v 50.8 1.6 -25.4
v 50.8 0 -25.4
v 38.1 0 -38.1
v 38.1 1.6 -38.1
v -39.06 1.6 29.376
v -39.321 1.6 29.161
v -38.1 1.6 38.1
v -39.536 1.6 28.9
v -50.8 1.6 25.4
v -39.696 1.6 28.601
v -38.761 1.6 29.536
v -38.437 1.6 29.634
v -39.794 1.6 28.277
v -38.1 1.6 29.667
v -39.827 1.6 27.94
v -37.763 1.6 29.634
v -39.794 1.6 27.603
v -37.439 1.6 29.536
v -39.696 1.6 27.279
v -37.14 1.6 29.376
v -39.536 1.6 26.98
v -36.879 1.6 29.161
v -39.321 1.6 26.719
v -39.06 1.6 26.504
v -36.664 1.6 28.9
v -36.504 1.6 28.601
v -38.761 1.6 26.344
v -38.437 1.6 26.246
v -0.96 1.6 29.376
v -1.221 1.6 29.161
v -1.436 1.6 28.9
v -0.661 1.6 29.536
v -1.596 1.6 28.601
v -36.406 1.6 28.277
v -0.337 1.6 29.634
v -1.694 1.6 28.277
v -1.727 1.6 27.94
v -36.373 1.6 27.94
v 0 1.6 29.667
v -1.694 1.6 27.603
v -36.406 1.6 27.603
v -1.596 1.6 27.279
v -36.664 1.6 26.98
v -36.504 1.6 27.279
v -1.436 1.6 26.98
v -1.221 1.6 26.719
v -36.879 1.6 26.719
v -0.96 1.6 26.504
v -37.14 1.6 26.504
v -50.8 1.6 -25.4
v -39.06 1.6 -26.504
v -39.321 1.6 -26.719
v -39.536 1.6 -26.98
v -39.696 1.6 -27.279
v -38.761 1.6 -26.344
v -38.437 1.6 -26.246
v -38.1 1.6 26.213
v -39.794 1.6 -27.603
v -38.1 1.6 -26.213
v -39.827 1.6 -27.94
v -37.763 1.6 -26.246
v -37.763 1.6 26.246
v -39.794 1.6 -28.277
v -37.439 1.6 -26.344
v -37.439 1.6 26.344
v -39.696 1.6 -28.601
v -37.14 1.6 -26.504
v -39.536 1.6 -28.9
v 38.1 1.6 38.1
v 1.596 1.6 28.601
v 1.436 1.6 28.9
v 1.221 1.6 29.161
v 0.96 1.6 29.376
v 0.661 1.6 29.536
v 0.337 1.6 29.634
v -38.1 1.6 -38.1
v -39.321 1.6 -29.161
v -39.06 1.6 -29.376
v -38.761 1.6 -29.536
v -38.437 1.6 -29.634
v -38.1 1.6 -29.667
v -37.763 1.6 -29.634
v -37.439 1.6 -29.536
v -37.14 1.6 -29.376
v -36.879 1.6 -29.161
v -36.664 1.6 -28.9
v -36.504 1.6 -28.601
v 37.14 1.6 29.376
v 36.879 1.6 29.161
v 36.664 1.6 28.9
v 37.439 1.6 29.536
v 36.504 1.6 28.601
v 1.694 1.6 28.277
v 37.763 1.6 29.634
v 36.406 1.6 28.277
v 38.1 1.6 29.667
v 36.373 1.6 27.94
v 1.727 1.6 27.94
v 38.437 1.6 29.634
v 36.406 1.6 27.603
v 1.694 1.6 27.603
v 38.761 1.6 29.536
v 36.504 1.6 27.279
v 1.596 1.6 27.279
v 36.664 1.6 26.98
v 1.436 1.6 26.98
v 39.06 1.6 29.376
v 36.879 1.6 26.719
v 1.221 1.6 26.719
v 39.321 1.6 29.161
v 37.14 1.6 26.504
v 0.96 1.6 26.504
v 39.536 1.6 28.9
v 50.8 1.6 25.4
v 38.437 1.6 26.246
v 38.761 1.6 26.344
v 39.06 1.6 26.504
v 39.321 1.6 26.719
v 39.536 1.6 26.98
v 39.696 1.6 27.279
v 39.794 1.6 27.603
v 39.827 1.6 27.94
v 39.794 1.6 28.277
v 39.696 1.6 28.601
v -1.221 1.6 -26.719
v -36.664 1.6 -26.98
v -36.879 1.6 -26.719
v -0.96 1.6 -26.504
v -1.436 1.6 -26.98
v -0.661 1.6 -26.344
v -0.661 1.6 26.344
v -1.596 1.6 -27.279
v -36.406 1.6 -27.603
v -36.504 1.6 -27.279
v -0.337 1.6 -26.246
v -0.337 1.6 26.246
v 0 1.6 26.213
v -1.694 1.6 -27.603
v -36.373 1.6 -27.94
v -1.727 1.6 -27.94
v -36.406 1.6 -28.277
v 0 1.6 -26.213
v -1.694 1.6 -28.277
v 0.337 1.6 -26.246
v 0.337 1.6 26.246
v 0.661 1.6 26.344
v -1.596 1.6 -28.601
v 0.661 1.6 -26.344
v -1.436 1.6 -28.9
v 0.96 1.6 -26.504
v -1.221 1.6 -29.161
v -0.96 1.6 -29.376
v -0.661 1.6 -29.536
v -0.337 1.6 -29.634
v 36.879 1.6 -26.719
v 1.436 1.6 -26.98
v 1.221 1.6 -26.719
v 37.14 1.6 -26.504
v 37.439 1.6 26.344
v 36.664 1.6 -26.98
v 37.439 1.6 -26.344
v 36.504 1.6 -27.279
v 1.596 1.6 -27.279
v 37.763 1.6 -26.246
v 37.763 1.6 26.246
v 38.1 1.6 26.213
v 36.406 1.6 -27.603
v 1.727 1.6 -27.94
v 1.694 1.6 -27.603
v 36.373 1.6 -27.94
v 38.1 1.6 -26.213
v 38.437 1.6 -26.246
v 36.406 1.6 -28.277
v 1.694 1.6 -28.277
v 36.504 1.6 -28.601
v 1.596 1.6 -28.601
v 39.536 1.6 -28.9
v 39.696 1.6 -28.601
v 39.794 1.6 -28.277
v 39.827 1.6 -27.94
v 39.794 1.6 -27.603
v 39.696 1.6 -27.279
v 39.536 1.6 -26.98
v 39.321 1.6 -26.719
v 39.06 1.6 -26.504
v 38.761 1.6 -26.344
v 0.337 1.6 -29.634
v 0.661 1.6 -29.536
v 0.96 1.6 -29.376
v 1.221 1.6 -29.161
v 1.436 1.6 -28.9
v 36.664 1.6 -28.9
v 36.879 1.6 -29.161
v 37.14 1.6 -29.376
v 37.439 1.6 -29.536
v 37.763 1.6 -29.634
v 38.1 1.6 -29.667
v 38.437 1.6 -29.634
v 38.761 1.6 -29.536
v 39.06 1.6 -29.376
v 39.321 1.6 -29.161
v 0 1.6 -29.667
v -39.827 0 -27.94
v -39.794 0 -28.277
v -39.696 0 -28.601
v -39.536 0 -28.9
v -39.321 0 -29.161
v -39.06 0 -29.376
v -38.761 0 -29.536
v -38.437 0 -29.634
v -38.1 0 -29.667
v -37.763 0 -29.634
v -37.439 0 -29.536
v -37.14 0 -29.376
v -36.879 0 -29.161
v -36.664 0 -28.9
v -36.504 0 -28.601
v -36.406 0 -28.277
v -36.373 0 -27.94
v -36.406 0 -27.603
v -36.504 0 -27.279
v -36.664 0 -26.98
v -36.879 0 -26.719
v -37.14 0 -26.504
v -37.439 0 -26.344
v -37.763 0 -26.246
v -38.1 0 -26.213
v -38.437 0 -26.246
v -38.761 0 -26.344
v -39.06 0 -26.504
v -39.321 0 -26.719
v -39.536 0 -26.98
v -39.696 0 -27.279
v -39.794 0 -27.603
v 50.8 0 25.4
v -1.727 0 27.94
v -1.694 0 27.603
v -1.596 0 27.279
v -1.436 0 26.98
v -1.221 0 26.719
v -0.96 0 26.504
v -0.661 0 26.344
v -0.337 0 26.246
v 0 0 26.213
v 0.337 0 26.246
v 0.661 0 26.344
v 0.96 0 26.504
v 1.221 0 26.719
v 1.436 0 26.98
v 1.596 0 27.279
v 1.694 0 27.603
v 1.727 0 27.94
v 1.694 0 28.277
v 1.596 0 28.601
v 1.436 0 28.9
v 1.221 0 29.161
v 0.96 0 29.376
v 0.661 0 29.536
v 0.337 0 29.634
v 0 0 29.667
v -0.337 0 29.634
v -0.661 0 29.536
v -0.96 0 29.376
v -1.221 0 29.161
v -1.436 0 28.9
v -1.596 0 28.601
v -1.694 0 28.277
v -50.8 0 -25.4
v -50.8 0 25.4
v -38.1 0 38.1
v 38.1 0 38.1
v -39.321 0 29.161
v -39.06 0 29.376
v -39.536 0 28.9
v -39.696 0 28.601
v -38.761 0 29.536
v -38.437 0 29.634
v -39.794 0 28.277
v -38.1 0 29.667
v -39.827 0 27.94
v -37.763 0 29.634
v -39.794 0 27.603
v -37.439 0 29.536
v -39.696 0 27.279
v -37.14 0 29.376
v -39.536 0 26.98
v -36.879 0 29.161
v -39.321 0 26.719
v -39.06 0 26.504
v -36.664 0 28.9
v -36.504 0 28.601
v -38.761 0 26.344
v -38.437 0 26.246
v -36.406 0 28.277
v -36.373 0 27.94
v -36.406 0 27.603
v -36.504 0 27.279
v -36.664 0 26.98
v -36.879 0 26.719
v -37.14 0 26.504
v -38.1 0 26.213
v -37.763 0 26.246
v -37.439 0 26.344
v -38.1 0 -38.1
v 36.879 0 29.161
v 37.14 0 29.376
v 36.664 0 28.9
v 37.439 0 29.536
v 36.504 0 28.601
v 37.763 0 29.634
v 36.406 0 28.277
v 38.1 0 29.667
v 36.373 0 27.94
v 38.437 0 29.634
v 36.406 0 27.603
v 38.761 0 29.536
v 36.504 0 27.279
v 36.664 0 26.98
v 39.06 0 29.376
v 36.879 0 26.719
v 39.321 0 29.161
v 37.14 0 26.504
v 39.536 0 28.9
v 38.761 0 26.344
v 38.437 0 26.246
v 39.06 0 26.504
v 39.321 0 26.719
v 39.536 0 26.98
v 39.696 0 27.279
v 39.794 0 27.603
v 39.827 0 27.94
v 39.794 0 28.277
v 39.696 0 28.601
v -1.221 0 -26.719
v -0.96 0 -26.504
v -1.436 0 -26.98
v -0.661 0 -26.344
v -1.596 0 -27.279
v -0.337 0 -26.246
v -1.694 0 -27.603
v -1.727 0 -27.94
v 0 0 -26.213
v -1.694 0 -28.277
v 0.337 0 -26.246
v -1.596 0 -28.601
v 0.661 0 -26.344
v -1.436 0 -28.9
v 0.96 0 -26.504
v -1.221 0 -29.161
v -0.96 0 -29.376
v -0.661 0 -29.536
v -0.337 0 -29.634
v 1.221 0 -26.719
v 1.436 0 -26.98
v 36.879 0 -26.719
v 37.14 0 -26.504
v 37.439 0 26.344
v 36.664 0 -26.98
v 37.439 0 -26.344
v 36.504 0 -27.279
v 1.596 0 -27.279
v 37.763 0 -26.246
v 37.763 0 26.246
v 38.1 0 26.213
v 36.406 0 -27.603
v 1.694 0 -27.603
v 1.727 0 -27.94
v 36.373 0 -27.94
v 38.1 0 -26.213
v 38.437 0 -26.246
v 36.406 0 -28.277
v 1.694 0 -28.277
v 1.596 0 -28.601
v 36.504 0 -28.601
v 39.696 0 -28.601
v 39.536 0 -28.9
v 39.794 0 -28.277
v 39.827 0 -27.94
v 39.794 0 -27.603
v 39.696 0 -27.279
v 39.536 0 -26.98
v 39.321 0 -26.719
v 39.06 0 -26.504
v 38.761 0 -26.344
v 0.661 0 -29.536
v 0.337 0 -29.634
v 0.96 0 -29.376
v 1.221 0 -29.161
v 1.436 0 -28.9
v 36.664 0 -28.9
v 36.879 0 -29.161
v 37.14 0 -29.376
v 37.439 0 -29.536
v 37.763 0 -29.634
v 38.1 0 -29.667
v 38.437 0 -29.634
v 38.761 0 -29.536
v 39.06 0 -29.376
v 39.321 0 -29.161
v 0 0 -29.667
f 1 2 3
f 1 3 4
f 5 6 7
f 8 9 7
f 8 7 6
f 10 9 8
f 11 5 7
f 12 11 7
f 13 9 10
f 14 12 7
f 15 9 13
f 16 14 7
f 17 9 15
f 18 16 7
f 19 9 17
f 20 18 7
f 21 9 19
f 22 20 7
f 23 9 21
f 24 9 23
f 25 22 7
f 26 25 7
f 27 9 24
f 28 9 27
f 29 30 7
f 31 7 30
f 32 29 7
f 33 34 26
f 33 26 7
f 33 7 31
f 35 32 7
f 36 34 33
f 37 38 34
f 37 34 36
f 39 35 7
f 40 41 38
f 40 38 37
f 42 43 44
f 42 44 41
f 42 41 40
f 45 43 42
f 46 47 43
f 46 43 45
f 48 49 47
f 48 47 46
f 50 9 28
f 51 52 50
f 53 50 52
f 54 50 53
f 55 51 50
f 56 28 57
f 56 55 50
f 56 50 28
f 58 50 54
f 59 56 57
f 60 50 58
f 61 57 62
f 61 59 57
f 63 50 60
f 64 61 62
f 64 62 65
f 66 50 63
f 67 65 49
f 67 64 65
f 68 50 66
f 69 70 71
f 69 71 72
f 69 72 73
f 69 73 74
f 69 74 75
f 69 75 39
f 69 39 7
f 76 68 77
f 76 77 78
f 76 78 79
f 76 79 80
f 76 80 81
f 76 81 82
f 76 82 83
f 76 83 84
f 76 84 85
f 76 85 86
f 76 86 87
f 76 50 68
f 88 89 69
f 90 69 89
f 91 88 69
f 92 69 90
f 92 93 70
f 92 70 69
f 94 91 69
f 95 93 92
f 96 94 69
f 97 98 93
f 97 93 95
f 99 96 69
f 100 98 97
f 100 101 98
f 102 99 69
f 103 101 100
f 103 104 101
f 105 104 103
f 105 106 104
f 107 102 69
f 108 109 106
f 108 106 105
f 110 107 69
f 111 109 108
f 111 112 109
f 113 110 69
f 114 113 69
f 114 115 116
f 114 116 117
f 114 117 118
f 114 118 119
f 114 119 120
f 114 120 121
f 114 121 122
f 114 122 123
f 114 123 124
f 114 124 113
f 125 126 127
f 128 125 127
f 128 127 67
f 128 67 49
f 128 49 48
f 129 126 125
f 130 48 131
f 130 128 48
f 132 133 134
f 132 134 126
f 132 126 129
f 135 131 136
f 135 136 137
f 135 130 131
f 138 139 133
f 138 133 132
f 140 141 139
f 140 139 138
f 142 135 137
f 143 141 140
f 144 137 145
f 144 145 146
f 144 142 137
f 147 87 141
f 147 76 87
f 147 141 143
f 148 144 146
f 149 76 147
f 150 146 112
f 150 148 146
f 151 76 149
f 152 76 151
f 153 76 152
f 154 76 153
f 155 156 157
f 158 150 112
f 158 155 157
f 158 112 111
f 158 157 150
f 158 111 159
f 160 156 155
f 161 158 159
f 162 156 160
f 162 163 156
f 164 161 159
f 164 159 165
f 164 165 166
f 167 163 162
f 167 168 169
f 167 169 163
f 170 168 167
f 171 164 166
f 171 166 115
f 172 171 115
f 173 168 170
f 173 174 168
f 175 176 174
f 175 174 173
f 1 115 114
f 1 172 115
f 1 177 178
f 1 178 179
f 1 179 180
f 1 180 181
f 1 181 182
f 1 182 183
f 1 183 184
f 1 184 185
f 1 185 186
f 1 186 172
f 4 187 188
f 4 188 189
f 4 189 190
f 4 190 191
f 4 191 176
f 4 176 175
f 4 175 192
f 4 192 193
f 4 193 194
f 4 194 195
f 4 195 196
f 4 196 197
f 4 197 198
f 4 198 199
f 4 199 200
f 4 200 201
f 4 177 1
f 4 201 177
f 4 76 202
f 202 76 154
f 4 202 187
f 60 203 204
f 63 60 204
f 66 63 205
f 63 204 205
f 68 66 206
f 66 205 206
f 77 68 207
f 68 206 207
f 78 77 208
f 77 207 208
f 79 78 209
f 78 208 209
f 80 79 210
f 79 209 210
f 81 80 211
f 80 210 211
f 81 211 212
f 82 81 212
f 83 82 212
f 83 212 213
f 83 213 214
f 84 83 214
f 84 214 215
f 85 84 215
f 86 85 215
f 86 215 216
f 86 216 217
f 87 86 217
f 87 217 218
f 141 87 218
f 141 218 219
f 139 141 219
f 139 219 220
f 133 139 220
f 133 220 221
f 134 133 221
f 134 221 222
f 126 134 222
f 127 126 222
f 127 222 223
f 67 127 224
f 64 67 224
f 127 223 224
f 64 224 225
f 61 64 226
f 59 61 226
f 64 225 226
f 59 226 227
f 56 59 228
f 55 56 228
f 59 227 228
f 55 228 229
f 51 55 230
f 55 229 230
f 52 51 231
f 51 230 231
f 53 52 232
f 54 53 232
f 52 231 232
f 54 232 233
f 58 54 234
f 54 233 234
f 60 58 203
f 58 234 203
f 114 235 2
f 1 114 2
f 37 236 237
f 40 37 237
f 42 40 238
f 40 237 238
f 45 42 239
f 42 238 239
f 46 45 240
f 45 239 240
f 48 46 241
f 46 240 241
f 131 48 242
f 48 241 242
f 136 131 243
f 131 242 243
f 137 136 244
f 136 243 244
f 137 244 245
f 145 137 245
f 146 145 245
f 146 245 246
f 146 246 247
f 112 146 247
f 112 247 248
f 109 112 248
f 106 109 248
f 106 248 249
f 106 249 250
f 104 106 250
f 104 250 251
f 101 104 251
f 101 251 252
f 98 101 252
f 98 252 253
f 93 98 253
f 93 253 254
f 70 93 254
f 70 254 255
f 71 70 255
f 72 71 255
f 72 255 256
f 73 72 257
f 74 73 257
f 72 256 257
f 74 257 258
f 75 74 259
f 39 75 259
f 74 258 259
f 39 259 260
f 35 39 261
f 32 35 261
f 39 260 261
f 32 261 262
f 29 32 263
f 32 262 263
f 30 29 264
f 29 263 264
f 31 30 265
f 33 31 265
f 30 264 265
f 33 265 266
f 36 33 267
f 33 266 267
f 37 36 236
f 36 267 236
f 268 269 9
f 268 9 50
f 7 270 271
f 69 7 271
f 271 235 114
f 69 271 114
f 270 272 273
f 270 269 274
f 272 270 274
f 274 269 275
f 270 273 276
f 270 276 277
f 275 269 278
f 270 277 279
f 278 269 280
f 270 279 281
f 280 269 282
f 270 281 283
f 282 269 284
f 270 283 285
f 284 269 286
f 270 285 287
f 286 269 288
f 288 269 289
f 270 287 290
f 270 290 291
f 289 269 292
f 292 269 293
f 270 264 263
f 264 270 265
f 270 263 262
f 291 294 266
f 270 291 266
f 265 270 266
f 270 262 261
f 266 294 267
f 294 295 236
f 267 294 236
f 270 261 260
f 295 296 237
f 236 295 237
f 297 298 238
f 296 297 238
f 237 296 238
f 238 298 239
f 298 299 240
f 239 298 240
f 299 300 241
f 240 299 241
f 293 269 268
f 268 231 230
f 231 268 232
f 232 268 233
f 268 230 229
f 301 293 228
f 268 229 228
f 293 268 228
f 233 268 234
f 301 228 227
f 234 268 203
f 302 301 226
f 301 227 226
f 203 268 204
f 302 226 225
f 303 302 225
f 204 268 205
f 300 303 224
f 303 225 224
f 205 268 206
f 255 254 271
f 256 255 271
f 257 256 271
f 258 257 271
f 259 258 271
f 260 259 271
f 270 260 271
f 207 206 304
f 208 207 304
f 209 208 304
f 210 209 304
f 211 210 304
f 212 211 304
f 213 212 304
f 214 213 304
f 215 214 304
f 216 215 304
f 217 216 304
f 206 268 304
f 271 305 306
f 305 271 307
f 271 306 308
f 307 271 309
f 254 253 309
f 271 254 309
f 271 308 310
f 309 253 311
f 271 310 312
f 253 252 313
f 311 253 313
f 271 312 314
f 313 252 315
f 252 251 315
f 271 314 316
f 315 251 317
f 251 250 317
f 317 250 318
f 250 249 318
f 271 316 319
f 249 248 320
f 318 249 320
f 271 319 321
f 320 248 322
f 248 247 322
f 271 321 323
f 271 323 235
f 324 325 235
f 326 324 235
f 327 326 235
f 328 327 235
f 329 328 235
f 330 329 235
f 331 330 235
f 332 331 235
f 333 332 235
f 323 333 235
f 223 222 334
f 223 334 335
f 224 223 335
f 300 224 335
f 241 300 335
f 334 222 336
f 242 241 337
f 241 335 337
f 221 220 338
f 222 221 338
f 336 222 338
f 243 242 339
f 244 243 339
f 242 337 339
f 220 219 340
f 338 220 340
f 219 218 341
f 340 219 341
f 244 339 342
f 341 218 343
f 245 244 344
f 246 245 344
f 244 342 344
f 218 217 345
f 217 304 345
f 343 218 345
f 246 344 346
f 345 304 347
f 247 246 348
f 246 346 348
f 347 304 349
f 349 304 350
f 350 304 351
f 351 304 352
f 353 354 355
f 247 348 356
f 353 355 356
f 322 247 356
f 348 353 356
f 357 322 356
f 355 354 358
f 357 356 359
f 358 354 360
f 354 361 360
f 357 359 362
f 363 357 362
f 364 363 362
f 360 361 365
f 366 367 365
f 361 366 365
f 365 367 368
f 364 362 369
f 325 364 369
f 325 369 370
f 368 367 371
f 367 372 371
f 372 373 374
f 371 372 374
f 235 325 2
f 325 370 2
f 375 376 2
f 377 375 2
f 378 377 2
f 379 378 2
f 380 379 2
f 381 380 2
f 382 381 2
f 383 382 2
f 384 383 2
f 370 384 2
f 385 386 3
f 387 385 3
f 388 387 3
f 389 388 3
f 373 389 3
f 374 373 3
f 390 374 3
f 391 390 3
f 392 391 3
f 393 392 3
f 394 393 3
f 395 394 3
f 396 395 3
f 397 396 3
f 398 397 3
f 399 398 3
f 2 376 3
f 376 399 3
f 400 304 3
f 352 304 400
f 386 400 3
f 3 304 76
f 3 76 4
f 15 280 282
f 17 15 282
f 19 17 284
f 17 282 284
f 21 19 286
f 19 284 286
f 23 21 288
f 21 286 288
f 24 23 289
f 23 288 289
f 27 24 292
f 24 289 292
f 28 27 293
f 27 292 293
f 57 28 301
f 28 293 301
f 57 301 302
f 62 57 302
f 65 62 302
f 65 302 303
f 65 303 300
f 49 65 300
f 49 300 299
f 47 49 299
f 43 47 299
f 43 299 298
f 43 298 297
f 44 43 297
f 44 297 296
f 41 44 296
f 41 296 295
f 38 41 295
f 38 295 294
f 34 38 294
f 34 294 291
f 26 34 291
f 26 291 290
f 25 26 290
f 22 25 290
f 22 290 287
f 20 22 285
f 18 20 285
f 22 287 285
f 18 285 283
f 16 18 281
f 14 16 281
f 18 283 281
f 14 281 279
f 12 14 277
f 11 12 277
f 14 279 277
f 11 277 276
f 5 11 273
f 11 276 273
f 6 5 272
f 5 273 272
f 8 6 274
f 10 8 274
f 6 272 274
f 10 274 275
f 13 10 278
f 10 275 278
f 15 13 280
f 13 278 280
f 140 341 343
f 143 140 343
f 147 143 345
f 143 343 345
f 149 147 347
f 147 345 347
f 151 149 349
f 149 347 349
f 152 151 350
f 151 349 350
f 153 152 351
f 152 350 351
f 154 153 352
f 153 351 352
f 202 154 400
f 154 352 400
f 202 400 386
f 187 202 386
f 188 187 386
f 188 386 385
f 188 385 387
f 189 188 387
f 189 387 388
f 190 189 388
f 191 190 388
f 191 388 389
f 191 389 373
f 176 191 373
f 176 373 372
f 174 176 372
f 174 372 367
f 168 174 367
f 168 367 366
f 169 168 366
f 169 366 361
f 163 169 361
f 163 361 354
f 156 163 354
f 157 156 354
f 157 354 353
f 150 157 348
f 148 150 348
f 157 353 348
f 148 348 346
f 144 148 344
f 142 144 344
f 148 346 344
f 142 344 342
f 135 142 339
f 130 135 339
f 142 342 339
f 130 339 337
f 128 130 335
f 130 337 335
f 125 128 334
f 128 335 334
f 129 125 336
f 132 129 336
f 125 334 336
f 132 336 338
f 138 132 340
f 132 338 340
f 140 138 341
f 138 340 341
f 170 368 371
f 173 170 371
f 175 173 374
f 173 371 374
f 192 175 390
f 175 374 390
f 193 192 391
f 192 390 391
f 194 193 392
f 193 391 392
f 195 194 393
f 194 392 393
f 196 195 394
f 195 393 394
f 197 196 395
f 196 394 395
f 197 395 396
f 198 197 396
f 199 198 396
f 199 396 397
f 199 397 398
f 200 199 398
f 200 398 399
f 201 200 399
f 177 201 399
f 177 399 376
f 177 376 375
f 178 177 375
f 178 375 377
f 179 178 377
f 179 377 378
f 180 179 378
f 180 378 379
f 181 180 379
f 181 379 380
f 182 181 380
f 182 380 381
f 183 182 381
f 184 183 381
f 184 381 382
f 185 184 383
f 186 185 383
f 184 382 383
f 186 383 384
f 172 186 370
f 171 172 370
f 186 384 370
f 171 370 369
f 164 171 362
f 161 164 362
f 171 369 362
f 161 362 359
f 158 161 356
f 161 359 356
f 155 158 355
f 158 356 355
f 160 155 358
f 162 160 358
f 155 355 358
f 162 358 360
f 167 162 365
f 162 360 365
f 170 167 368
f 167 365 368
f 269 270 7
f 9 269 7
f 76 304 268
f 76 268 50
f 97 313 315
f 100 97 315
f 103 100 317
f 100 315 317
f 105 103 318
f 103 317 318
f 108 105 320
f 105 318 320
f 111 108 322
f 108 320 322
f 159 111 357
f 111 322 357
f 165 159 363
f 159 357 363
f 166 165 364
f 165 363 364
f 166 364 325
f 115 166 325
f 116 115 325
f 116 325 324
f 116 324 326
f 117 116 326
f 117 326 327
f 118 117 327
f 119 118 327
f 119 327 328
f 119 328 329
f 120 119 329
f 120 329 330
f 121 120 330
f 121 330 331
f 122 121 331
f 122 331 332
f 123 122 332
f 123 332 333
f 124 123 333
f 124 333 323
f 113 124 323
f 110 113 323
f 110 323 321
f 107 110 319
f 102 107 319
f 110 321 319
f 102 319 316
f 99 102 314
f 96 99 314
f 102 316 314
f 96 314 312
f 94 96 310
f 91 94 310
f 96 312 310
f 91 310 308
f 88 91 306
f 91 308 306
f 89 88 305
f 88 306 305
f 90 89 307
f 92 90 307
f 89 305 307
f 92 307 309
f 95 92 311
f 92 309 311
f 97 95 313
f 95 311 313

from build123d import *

# Parameters (mm, degrees)
SKETCH1_W             = 101.6
SKETCH1_H             = 76.2
BOSS_EXTRUDE1_DEPTH   = 1.600000102
F_4_CLEARANCE_HOLE1_D = 3.4544
CHAMFER1_SIZE         = 12.7


with BuildPart() as part:
    # Sketch1 → Boss-Extrude1 (new body)
    with BuildSketch(Plane(origin=(0, 0, 0), x_dir=(1, 0, 0), z_dir=(0, 1, 0))):
        Rectangle(SKETCH1_W, SKETCH1_H)
    extrude(amount=BOSS_EXTRUDE1_DEPTH)

    # #4 Clearance Hole1 (through all)
    with Locations(Plane(origin=(0, 1.600000102, 0), x_dir=(1, 0, 0), z_dir=(0, 1, 0))):
        with Locations((38.1, -27.94), (-38.1, -27.94), (0, -27.94), (38.1, 27.94), (0, 27.94), (-38.1, 27.94)):
            Hole(F_4_CLEARANCE_HOLE1_D / 2)

    # Chamfer1
    chamfer1_edges = [part.edges().sort_by_distance(p)[0] for p in [
        (-50.8, 0.800000051, -38.1),
        (50.8, 0.800000051, -38.1),
        (50.8, 0.800000051, 38.1),
        (-50.8, 0.800000051, 38.1),
    ]]
    chamfer(chamfer1_edges, length=CHAMFER1_SIZE)


solid = part.part
